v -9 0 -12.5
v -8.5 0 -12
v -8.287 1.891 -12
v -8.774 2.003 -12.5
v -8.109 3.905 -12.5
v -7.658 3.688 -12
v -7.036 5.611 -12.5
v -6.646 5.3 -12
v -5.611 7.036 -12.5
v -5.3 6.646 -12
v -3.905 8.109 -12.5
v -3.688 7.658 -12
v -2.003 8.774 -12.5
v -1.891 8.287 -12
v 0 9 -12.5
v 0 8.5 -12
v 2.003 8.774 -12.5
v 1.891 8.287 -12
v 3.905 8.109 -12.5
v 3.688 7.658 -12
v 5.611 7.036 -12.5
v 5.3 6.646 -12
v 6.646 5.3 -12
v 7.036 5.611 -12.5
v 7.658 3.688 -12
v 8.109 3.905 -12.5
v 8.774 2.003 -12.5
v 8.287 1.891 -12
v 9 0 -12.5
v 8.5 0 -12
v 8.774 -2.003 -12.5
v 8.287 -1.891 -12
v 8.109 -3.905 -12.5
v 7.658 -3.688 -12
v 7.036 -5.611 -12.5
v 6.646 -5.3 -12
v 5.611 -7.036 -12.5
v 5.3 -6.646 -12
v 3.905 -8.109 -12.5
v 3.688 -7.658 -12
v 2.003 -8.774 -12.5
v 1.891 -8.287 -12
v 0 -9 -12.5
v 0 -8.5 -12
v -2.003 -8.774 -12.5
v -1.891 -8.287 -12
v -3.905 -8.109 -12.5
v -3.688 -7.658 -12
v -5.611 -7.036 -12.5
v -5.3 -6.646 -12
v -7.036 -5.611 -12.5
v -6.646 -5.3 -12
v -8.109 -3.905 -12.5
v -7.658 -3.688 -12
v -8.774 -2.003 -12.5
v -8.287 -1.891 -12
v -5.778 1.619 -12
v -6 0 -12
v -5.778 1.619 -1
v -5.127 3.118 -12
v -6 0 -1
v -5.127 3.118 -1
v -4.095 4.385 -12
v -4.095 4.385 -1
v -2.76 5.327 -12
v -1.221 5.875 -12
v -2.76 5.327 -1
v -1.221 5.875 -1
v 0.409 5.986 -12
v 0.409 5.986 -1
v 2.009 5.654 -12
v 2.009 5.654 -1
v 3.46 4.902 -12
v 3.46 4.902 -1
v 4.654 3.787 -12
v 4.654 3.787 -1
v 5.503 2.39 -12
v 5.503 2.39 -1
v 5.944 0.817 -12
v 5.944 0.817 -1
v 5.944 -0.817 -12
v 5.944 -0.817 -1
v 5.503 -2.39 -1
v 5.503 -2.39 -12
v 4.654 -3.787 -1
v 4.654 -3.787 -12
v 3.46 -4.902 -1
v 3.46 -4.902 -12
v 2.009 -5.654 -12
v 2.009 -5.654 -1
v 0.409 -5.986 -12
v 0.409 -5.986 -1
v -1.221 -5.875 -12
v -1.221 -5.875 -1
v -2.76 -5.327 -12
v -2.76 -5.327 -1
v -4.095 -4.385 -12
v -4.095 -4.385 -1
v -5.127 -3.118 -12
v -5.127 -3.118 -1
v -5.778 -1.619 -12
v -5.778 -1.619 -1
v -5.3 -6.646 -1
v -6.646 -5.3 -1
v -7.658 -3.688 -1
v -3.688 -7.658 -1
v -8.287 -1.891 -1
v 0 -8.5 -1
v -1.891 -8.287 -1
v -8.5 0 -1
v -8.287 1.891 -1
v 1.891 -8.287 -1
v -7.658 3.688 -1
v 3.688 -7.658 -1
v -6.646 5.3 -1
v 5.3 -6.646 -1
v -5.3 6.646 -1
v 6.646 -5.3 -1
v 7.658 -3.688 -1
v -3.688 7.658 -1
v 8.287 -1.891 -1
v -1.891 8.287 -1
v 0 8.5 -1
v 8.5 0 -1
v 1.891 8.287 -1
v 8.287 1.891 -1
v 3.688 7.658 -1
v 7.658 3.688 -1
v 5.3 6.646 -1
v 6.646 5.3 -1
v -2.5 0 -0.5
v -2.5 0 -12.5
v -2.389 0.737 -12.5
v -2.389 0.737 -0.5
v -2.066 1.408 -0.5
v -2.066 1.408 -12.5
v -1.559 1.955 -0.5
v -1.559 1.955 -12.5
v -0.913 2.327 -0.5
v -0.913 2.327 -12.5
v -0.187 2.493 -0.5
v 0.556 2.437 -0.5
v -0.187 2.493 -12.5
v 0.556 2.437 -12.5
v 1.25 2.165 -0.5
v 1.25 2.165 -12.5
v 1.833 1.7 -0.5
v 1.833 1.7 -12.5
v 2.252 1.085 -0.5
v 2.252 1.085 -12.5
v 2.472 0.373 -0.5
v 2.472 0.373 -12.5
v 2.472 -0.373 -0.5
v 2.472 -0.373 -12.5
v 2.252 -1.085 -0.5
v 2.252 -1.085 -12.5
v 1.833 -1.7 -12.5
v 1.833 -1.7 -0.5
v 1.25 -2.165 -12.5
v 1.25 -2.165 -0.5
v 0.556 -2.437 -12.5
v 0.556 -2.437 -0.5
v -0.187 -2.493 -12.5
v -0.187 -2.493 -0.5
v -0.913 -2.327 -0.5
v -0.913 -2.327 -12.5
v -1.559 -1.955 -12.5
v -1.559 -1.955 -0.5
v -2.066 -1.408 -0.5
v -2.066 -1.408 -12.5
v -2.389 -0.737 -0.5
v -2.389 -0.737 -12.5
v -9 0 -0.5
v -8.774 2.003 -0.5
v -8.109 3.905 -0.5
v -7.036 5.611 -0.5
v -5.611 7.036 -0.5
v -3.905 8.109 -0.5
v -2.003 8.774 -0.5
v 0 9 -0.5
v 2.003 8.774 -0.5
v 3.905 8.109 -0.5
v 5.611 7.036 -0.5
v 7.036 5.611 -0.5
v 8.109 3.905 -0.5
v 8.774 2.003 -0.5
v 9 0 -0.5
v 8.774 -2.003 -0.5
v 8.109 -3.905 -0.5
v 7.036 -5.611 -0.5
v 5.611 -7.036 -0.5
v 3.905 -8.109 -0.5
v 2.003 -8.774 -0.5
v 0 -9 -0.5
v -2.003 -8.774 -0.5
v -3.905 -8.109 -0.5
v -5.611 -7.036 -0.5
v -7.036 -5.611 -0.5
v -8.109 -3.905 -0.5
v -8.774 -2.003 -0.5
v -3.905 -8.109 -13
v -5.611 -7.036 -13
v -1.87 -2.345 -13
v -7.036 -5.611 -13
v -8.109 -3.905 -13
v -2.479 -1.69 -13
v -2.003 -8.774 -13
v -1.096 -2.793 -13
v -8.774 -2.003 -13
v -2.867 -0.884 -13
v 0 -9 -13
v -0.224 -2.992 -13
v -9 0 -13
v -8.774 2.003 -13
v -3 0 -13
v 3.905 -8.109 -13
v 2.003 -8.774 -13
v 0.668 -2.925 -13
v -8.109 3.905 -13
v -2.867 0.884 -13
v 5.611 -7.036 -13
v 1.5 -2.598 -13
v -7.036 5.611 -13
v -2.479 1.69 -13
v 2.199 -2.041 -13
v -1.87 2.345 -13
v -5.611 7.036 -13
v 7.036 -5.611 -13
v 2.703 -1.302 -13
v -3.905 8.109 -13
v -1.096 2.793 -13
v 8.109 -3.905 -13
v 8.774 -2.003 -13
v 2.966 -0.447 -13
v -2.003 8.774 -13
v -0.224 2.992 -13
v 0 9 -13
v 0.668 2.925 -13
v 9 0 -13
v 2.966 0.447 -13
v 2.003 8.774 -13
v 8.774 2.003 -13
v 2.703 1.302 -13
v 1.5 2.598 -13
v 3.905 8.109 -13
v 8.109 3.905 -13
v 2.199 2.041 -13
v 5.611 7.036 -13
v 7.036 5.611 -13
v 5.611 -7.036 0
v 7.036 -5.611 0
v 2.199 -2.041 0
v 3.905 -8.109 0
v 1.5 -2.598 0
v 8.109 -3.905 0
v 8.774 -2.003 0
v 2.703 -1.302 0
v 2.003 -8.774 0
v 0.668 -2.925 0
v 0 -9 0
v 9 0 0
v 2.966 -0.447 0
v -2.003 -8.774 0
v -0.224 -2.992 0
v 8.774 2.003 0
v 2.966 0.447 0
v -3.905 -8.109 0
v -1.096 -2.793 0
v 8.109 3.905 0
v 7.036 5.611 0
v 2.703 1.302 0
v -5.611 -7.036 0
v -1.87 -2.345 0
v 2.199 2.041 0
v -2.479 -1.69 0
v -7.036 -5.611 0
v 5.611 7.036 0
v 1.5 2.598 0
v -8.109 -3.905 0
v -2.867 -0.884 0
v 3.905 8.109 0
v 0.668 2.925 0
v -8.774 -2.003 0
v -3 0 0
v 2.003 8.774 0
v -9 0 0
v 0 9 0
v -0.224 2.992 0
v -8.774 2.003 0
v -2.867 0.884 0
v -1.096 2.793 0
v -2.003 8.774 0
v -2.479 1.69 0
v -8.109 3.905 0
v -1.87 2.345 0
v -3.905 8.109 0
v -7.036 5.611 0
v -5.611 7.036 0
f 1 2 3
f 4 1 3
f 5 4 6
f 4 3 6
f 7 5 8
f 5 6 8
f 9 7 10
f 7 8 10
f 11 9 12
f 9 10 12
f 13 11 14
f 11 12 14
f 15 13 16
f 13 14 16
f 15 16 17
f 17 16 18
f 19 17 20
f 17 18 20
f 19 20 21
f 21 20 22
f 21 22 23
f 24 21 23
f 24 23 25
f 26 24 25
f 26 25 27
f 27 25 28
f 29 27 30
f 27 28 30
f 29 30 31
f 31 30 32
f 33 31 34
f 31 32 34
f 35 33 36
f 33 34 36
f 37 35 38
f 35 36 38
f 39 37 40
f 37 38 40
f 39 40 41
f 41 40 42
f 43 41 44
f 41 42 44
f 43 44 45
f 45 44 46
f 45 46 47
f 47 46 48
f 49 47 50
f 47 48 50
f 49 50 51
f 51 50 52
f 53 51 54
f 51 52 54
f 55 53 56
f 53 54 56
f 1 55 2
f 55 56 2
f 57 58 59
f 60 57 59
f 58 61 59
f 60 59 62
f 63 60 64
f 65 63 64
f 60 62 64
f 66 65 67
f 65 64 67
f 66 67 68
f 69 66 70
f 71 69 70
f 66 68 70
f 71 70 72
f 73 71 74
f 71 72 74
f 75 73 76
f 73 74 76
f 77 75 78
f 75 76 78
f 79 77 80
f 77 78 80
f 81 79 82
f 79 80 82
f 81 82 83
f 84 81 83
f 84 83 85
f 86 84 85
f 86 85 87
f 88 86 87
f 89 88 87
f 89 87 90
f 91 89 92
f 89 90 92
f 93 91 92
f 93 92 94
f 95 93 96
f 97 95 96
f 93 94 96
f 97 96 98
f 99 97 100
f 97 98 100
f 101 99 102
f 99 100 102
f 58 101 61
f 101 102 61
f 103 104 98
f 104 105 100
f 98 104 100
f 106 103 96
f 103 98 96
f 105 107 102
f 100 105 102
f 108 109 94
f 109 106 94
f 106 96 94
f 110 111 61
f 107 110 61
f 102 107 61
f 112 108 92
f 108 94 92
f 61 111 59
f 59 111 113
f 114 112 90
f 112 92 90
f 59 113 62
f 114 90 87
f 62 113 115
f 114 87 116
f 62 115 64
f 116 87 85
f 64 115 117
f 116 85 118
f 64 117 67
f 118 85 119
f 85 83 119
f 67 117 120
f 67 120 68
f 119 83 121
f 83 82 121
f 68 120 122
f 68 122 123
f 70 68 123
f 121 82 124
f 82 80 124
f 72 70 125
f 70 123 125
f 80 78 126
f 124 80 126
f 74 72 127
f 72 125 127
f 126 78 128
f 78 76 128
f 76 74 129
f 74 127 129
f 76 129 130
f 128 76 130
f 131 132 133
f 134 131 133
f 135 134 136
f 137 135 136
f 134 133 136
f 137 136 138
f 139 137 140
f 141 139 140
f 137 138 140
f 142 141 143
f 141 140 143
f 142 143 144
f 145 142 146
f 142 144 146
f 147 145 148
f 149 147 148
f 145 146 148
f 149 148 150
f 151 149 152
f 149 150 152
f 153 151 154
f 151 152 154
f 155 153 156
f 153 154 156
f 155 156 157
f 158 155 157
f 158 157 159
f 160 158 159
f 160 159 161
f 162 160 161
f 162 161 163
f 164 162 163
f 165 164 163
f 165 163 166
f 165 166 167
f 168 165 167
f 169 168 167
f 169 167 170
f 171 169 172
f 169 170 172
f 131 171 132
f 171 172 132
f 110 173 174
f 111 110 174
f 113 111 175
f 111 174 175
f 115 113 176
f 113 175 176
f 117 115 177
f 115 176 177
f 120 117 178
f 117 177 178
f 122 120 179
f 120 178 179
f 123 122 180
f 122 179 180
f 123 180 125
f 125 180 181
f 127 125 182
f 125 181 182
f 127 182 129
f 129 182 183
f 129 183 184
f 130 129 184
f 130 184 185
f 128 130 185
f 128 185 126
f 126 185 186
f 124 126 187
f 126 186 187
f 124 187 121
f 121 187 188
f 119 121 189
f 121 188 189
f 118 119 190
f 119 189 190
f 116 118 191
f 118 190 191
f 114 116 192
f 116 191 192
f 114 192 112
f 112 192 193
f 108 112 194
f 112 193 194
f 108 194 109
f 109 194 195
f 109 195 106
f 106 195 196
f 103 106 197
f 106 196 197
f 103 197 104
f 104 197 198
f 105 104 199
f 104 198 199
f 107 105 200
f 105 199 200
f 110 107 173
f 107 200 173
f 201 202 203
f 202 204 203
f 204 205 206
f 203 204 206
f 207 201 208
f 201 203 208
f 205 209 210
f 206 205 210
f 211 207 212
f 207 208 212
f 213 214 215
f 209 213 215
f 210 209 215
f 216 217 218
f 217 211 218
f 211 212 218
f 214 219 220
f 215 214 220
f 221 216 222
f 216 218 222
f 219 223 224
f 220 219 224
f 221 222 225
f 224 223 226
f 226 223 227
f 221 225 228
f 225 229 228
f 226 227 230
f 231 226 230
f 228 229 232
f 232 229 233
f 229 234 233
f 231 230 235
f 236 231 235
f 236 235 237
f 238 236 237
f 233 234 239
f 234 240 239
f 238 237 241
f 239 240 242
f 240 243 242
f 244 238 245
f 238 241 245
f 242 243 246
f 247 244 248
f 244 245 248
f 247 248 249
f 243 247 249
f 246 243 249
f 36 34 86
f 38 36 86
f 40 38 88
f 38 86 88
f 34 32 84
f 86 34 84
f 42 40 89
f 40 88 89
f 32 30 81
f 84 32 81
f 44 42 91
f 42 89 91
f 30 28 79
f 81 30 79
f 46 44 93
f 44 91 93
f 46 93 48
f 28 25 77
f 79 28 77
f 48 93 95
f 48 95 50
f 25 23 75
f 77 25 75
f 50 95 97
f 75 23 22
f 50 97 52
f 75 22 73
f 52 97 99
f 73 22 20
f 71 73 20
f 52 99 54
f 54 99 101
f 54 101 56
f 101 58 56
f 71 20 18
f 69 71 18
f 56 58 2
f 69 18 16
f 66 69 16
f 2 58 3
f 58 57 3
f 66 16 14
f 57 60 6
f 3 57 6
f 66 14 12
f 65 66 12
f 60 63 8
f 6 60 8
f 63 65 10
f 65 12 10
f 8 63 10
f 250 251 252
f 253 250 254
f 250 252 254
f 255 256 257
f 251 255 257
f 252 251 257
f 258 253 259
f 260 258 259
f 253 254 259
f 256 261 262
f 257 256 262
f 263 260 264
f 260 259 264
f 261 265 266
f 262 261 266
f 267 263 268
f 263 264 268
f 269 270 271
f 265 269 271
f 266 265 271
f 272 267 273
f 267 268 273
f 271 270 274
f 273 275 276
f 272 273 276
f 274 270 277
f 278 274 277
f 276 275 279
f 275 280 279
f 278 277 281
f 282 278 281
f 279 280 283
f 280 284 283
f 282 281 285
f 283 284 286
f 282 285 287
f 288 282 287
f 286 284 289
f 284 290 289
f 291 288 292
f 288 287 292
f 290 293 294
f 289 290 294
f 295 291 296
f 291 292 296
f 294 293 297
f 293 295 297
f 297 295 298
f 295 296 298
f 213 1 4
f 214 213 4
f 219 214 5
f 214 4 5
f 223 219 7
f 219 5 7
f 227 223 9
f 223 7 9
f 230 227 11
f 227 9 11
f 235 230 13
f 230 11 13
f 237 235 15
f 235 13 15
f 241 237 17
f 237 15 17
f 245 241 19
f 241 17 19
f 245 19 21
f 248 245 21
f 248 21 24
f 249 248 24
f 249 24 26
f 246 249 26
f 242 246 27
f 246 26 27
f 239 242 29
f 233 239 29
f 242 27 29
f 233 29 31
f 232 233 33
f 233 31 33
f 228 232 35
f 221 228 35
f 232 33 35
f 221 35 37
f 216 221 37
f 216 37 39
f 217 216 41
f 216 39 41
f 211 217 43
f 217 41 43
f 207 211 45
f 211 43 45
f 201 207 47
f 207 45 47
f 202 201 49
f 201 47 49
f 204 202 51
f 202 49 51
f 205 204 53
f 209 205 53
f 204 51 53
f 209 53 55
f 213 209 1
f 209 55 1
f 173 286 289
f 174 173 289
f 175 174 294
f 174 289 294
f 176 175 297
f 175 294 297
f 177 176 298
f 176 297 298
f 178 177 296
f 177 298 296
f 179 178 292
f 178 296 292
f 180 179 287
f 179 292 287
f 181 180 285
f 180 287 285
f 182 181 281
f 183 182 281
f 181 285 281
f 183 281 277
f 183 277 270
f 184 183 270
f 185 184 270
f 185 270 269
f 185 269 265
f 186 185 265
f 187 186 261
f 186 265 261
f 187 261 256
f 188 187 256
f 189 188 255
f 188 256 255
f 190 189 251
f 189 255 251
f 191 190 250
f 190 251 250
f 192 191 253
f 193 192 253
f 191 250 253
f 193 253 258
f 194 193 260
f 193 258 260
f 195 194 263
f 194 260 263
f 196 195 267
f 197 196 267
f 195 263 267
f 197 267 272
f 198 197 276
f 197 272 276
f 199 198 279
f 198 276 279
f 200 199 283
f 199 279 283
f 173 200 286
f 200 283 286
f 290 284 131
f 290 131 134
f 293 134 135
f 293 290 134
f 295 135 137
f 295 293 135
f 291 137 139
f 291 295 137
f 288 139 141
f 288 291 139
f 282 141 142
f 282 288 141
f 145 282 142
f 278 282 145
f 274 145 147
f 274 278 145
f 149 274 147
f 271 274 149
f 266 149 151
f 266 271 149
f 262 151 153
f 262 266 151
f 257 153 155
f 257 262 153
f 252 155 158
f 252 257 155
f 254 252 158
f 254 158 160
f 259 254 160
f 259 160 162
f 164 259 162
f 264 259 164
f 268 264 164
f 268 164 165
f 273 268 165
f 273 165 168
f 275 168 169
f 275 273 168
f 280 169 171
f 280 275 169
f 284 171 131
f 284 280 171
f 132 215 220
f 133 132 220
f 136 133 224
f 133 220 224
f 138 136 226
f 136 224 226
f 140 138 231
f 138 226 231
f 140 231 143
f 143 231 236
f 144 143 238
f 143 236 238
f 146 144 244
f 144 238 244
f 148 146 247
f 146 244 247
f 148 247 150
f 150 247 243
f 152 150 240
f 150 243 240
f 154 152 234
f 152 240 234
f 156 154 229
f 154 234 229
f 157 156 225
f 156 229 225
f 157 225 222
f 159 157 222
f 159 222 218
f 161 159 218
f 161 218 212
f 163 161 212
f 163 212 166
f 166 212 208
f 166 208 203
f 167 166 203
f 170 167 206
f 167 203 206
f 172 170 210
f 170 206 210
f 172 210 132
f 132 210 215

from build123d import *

# Parameters (mm, degrees)
CHAMFER1_SIZE = 0.5


with BuildPart() as part:
    # Sketch1 → Revolve1 (revolve)
    with BuildSketch(Plane(origin=(0, 0, 0), x_dir=(1, 0, 0), z_dir=(0, 1, 0))):
        Polygon((-2.5, 0), (-2.5, 13), (-9, 13), (-9, 12), (-6, 12), (-6, 1), (-9, 1), (-9, 0), align=None)
    revolve(axis=Axis((0, 0, 0), (0, 0, -1)))

    # Chamfer1
    chamfer1_edges = [part.edges().sort_by_distance(p)[0] for p in [
        (2.5, 0, -13),
        (2.5, 0, 0),
        (9, 0, -1),
        (9, 0, -12),
    ]]
    chamfer(chamfer1_edges, length=CHAMFER1_SIZE)


solid = part.part
